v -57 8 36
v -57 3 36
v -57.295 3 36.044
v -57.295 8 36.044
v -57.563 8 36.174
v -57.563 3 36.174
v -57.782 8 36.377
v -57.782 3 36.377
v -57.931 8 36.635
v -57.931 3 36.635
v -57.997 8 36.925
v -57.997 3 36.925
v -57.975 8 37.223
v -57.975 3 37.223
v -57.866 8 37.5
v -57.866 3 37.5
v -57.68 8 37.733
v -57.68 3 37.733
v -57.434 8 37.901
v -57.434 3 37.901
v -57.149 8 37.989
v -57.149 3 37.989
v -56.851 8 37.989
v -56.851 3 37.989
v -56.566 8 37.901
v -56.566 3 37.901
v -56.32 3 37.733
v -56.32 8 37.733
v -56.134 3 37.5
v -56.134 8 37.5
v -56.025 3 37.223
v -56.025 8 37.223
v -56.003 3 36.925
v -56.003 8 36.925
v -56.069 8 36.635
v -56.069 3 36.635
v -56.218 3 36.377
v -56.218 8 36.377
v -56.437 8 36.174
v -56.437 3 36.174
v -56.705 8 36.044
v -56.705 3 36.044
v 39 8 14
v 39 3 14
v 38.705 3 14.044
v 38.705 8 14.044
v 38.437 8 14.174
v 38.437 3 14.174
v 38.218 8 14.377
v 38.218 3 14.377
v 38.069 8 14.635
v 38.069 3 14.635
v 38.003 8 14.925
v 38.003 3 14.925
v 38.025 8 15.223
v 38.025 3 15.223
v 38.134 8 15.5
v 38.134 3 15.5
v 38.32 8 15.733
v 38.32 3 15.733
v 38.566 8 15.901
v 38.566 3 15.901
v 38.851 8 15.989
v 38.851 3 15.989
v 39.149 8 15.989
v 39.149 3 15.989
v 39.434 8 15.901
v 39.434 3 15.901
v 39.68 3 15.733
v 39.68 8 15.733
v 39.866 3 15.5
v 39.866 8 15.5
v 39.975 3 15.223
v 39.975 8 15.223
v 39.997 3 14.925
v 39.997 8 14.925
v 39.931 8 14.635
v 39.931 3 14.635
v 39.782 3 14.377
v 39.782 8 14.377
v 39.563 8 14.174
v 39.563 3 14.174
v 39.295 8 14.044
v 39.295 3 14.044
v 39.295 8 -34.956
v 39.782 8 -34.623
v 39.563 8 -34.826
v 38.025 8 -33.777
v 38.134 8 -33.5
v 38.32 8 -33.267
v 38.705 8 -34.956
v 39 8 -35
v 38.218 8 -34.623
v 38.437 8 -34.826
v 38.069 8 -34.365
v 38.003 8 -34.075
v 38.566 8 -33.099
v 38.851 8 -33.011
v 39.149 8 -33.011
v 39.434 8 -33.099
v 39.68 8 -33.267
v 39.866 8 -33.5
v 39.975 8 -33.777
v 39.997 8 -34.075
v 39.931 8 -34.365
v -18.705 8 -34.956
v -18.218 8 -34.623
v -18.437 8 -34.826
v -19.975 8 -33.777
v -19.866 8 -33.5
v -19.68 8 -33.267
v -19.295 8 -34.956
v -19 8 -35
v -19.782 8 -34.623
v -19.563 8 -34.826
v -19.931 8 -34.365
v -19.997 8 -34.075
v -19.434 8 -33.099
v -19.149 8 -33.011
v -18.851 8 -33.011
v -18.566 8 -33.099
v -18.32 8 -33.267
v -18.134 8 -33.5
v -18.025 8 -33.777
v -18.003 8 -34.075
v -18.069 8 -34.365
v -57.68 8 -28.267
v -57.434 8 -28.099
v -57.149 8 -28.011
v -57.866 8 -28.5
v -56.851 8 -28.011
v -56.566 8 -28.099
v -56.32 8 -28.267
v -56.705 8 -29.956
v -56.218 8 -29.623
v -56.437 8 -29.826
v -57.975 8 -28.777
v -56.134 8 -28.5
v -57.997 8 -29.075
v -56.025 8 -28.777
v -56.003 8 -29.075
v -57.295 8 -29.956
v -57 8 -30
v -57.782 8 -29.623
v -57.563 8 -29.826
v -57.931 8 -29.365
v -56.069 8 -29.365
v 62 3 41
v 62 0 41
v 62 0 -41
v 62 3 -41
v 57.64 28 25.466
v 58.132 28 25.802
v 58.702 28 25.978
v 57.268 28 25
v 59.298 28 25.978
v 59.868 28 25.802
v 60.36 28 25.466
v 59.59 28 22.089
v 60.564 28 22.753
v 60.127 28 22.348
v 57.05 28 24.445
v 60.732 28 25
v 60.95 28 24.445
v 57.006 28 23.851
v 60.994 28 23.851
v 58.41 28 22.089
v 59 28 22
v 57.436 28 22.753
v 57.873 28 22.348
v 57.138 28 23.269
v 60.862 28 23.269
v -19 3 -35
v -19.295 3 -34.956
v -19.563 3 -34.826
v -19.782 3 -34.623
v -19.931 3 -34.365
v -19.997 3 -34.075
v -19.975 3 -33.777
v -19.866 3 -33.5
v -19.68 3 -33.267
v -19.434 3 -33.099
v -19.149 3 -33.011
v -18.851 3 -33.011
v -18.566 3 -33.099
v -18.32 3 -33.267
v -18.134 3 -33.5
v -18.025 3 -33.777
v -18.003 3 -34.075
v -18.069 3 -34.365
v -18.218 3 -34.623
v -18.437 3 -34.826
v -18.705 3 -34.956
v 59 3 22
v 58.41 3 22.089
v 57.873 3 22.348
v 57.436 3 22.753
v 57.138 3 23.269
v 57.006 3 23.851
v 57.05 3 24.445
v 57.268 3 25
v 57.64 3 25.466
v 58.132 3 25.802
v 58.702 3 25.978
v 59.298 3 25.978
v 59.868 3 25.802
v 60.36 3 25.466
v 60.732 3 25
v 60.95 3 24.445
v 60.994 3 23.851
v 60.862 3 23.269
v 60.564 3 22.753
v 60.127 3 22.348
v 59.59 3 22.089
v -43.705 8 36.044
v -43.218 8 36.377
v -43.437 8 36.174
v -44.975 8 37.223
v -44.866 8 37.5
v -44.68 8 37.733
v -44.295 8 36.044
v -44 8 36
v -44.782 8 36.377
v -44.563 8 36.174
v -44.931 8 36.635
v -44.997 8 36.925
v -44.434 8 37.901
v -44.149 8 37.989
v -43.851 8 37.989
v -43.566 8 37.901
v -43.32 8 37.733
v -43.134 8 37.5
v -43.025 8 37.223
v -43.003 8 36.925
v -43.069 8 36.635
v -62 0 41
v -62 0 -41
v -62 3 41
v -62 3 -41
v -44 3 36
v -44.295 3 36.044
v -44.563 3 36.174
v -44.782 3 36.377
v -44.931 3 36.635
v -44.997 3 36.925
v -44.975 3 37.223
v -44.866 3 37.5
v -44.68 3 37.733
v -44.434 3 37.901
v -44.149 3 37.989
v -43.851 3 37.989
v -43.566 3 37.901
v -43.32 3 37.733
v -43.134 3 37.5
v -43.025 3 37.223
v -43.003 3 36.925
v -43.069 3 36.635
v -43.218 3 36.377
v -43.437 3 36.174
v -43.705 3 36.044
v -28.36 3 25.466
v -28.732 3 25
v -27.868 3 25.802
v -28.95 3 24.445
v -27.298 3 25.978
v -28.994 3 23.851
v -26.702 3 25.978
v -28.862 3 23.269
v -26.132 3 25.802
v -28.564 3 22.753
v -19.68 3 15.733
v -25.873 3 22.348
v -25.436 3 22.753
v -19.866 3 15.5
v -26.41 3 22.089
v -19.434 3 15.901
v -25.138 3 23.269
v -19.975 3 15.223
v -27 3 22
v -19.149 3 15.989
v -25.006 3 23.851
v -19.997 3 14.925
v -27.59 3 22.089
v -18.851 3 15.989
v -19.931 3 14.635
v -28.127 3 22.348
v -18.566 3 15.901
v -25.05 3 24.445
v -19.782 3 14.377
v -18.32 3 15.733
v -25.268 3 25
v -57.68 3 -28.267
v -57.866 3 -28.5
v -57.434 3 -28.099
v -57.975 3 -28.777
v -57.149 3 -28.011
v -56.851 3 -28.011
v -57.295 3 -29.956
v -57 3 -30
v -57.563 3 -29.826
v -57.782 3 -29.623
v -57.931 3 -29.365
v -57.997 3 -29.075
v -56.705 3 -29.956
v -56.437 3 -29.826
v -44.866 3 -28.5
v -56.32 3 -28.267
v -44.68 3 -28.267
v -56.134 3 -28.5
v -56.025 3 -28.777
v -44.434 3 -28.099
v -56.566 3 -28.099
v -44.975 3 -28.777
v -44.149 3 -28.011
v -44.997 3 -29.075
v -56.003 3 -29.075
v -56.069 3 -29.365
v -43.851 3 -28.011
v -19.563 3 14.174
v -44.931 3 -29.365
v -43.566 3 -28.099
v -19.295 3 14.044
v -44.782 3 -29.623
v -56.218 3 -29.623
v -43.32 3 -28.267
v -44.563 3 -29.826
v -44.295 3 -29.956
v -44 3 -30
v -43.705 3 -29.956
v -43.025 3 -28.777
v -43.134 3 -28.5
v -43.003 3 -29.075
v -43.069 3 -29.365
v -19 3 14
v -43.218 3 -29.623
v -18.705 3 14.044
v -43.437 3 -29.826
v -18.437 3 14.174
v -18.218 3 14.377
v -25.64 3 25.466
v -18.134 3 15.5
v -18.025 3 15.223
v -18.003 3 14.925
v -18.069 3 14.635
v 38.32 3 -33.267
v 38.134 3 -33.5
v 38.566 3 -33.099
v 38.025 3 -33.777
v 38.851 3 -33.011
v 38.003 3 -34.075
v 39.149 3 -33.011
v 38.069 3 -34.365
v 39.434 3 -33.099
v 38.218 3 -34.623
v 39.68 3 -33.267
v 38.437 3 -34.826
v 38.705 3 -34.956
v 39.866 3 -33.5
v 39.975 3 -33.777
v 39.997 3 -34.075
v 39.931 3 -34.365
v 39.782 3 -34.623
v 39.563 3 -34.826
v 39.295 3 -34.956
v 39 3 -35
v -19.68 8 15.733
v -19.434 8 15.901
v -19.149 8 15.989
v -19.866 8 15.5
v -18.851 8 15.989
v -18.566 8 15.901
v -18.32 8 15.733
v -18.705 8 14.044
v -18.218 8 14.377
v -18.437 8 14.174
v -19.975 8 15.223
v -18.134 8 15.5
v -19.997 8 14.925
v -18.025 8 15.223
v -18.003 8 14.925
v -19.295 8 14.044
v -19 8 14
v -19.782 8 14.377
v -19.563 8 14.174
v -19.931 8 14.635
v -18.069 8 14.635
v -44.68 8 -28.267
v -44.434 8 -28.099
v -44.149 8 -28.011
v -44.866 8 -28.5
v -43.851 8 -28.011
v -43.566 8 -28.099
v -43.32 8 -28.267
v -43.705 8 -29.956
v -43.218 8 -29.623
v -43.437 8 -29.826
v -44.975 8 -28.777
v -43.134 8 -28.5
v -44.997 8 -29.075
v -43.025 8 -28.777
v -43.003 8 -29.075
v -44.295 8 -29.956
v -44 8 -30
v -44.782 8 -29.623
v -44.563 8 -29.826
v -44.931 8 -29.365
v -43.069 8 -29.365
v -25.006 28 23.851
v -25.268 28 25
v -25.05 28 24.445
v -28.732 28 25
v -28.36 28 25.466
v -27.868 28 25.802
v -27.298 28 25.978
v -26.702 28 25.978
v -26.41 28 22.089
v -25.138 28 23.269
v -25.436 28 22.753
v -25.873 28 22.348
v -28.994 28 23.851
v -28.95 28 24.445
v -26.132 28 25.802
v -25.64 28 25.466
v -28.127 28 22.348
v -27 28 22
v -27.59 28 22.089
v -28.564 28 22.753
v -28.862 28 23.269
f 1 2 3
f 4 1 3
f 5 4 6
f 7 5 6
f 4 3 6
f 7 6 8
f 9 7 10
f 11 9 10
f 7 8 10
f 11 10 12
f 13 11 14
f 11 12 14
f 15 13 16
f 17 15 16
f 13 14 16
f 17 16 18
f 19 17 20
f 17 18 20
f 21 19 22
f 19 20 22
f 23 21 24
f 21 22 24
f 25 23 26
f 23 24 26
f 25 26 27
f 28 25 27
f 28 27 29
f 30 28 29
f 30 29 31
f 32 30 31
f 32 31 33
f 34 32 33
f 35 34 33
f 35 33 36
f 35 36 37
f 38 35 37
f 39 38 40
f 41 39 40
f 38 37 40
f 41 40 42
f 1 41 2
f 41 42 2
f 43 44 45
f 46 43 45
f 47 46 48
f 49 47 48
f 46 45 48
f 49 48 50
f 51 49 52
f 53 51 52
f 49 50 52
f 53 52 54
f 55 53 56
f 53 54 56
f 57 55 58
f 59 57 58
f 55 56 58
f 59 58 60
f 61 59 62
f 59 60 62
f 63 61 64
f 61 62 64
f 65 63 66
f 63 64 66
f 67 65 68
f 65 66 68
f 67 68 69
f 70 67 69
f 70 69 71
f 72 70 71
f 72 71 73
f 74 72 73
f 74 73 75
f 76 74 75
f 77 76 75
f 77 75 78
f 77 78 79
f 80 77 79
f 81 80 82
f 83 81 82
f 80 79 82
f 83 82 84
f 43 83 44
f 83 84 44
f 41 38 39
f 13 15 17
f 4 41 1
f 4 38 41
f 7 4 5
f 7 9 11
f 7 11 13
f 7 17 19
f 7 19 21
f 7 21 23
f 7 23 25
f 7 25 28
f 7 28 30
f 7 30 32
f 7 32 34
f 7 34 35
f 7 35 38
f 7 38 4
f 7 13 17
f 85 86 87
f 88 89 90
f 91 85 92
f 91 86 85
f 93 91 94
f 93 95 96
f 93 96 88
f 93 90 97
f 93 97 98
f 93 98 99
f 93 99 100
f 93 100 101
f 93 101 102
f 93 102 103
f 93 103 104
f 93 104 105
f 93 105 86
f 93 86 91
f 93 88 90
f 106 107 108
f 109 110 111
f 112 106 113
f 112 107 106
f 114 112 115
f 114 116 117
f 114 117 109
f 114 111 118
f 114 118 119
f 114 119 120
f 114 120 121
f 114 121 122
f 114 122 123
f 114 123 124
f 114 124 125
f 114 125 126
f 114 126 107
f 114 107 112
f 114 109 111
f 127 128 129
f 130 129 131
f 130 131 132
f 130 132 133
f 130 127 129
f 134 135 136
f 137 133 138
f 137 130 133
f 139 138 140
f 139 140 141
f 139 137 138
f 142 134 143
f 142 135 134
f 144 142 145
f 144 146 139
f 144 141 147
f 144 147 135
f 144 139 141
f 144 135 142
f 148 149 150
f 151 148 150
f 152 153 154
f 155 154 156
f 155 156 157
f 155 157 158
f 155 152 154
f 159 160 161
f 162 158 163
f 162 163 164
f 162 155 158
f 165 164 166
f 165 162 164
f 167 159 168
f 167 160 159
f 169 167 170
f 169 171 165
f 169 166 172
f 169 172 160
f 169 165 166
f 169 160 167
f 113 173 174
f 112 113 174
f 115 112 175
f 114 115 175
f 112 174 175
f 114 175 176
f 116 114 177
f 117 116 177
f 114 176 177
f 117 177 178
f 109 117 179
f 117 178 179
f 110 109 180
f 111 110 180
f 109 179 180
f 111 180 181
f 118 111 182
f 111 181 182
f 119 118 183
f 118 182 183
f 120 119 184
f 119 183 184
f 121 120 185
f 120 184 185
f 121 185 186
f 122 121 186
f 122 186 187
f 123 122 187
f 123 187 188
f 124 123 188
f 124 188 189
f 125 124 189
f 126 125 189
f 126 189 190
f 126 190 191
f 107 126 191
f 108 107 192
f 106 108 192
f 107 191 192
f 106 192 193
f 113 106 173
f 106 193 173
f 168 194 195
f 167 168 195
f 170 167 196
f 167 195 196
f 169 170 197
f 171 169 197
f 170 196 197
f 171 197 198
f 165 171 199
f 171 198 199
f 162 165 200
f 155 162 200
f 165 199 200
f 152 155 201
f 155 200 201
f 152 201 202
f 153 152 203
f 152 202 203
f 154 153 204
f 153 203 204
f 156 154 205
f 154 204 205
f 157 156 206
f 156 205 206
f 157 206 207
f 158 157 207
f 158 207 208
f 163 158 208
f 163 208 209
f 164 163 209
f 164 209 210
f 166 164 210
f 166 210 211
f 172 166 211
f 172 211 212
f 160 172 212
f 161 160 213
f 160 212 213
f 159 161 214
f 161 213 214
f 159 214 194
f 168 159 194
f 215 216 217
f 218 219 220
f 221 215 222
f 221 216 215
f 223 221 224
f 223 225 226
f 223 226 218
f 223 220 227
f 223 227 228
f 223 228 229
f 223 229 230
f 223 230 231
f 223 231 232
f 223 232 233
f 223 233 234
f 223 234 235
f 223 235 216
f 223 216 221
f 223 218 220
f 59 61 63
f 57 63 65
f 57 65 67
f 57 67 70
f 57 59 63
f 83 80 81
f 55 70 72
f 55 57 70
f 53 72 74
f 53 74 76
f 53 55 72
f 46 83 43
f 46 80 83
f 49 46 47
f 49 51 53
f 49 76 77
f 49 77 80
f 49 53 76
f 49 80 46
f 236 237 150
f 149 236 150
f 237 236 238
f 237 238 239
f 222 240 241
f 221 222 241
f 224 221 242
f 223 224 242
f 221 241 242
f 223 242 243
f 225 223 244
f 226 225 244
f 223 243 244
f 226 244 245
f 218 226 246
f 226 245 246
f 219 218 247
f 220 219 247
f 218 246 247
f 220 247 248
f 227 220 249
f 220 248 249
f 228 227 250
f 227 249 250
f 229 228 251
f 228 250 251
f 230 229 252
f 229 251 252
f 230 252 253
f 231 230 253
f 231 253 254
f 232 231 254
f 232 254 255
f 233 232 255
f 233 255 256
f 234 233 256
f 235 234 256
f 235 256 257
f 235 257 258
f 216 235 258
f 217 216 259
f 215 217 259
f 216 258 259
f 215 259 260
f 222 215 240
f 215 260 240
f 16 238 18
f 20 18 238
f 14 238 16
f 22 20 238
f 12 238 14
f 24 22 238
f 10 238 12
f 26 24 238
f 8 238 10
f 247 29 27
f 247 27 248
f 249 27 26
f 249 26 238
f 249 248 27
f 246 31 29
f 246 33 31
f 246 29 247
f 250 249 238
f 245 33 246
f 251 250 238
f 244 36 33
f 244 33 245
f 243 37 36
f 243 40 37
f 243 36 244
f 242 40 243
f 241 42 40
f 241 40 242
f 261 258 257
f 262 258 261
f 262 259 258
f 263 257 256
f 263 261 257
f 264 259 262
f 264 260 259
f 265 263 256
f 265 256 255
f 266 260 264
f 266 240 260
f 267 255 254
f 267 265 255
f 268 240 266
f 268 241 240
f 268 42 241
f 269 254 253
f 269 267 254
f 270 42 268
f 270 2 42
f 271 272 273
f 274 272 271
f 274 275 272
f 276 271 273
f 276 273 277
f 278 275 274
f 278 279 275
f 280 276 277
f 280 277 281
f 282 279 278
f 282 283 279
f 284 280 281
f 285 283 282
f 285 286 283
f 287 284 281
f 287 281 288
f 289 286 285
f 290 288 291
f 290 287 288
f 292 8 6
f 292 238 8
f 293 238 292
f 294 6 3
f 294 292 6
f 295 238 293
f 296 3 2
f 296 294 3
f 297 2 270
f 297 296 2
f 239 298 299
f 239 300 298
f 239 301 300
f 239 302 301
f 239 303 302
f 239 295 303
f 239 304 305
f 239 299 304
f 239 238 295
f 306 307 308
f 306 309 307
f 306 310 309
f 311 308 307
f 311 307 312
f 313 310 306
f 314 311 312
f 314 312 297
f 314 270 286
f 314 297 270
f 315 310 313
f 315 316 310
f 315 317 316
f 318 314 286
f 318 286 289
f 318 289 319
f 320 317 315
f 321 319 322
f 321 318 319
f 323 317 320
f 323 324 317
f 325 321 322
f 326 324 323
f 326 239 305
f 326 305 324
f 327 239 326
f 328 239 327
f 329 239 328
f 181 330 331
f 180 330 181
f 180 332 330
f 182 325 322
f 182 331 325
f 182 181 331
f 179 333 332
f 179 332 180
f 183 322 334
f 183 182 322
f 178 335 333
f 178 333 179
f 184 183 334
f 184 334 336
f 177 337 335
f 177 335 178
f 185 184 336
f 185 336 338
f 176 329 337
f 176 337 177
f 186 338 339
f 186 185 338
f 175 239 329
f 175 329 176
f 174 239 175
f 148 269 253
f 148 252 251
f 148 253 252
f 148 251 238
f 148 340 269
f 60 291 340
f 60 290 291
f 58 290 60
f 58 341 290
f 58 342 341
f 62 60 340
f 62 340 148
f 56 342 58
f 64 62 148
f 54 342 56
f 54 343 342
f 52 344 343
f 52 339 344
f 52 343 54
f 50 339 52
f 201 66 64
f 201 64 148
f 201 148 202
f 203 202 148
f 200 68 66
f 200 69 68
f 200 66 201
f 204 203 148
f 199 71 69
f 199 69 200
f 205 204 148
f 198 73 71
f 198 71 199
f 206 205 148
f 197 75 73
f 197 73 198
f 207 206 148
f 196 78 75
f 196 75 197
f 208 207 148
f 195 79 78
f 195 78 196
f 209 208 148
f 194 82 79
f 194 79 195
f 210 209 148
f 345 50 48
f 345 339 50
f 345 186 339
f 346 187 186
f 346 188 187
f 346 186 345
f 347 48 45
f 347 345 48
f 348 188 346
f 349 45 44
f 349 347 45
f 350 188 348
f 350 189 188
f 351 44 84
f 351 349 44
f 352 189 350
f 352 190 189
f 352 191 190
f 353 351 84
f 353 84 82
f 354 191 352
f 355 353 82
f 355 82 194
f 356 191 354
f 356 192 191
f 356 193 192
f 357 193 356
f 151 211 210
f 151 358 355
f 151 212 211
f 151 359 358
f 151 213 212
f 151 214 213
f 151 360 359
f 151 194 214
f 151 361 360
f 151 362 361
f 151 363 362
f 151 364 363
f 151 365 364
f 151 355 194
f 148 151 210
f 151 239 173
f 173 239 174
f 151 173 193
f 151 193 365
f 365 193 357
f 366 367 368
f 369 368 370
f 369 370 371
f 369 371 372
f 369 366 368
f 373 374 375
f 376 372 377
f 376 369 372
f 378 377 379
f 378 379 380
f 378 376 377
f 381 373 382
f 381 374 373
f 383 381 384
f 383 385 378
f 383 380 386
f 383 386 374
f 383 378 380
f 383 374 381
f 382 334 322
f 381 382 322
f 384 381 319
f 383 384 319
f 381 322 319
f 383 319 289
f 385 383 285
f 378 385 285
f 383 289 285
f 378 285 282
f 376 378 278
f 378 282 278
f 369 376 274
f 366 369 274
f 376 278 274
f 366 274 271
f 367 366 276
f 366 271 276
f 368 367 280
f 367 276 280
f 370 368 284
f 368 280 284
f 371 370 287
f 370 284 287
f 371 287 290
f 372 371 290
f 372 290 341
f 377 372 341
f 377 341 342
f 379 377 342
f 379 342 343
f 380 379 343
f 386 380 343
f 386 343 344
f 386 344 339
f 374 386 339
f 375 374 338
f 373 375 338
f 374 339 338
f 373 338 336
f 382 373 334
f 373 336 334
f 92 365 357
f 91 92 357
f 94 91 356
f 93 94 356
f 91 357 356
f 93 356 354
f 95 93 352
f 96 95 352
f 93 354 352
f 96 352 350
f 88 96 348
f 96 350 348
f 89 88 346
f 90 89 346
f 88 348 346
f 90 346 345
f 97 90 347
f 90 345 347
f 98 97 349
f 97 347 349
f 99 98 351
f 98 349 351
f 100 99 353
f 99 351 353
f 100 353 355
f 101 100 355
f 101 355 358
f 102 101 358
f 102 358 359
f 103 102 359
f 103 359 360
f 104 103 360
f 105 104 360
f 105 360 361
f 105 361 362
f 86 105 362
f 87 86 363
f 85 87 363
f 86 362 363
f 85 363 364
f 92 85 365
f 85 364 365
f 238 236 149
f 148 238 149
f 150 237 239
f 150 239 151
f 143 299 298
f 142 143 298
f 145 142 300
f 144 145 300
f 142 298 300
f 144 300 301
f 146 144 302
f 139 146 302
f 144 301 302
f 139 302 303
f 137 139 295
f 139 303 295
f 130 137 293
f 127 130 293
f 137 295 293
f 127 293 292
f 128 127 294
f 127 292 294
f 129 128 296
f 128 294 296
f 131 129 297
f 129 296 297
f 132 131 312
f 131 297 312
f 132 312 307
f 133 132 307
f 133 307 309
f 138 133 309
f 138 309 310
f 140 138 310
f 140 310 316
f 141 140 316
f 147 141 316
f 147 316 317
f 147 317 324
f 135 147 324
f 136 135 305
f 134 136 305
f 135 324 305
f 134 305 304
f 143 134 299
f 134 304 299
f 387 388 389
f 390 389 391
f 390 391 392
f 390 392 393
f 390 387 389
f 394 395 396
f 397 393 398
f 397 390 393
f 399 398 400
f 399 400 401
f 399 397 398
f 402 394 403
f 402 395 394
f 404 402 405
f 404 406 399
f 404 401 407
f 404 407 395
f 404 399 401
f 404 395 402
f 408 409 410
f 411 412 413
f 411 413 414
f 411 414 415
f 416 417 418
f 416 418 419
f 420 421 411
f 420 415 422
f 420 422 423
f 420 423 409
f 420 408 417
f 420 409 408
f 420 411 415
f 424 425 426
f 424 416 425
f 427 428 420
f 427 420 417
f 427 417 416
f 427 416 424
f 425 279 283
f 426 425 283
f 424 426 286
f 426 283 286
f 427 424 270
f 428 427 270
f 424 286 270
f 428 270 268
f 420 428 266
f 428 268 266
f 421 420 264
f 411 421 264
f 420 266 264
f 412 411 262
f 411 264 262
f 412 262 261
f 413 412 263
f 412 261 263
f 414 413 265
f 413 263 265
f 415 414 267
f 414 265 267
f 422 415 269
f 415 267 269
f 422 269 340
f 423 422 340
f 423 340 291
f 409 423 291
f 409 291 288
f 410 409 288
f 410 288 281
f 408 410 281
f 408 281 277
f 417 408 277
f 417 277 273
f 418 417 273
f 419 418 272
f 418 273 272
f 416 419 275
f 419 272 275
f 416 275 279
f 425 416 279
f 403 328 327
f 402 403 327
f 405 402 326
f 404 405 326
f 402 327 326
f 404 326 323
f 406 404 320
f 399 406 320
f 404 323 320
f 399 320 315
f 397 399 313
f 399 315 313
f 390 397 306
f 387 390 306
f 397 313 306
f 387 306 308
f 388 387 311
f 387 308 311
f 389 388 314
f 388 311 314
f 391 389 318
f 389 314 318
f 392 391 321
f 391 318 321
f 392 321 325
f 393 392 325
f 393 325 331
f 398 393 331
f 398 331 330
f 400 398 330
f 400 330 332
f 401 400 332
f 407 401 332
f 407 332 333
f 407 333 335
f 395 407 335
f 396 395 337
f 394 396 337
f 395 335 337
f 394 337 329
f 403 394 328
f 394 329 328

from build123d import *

# Parameters (mm, degrees)
SKETCH7_W           = 124
SKETCH7_H           = 82
BOSS_EXTRUDE3_DEPTH = 3
SKETCH8_R           = 2
BOSS_EXTRUDE4_DEPTH = 25
SKETCH9_R           = 1
BOSS_EXTRUDE5_DEPTH = 5
SKETCH10_R          = 1
BOSS_EXTRUDE6_DEPTH = 5


with BuildPart() as part:
    # Sketch7 → Boss-Extrude3 (new body)
    with BuildSketch(Plane(origin=(0, 0, 0), x_dir=(1, 0, 0), z_dir=(0, 1, 0))):
        Rectangle(SKETCH7_W, SKETCH7_H)
    extrude(amount=BOSS_EXTRUDE3_DEPTH)

    # Sketch8 → Boss-Extrude4 (add)
    with BuildSketch(Plane(origin=(0, 3, 0), x_dir=(1, 0, 0), z_dir=(0, 1, 0))):
        with Locations(Location((59, -24, 0), (0, 0, 90))):
            Circle(SKETCH8_R)
        with Locations(Location((-27, -24, 0), (0, 0, 90))):
            Circle(SKETCH8_R)
    extrude(amount=BOSS_EXTRUDE4_DEPTH)

    # Sketch9 → Boss-Extrude5 (add)
    with BuildSketch(Plane(origin=(0, 3, 0), x_dir=(1, 0, 0), z_dir=(0, 1, 0))):
        with Locations(Location((39, 34, 0), (0, 0, 90))):
            Circle(SKETCH9_R)
        with Locations(Location((-19, 34, 0), (0, 0, 90))):
            Circle(SKETCH9_R)
        with Locations(Location((-19, -15, 0), (0, 0, 90))):
            Circle(SKETCH9_R)
        with Locations(Location((39, -15, 0), (0, 0, 90))):
            Circle(SKETCH9_R)
    extrude(amount=BOSS_EXTRUDE5_DEPTH)

    # Sketch10 → Boss-Extrude6 (add)
    with BuildSketch(Plane(origin=(0, 3, 0), x_dir=(1, 0, 0), z_dir=(0, 1, 0))):
        with Locations(Location((-57, -37, 0), (0, 0, 90))):
            Circle(SKETCH10_R)
        with Locations(Location((-44, -37, 0), (0, 0, 90))):
            Circle(SKETCH10_R)
        with Locations(Location((-44, 29, 0), (0, 0, 90))):
            Circle(SKETCH10_R)
        with Locations(Location((-57, 29, 0), (0, 0, 90))):
            Circle(SKETCH10_R)
    extrude(amount=BOSS_EXTRUDE6_DEPTH)


solid = part.part
